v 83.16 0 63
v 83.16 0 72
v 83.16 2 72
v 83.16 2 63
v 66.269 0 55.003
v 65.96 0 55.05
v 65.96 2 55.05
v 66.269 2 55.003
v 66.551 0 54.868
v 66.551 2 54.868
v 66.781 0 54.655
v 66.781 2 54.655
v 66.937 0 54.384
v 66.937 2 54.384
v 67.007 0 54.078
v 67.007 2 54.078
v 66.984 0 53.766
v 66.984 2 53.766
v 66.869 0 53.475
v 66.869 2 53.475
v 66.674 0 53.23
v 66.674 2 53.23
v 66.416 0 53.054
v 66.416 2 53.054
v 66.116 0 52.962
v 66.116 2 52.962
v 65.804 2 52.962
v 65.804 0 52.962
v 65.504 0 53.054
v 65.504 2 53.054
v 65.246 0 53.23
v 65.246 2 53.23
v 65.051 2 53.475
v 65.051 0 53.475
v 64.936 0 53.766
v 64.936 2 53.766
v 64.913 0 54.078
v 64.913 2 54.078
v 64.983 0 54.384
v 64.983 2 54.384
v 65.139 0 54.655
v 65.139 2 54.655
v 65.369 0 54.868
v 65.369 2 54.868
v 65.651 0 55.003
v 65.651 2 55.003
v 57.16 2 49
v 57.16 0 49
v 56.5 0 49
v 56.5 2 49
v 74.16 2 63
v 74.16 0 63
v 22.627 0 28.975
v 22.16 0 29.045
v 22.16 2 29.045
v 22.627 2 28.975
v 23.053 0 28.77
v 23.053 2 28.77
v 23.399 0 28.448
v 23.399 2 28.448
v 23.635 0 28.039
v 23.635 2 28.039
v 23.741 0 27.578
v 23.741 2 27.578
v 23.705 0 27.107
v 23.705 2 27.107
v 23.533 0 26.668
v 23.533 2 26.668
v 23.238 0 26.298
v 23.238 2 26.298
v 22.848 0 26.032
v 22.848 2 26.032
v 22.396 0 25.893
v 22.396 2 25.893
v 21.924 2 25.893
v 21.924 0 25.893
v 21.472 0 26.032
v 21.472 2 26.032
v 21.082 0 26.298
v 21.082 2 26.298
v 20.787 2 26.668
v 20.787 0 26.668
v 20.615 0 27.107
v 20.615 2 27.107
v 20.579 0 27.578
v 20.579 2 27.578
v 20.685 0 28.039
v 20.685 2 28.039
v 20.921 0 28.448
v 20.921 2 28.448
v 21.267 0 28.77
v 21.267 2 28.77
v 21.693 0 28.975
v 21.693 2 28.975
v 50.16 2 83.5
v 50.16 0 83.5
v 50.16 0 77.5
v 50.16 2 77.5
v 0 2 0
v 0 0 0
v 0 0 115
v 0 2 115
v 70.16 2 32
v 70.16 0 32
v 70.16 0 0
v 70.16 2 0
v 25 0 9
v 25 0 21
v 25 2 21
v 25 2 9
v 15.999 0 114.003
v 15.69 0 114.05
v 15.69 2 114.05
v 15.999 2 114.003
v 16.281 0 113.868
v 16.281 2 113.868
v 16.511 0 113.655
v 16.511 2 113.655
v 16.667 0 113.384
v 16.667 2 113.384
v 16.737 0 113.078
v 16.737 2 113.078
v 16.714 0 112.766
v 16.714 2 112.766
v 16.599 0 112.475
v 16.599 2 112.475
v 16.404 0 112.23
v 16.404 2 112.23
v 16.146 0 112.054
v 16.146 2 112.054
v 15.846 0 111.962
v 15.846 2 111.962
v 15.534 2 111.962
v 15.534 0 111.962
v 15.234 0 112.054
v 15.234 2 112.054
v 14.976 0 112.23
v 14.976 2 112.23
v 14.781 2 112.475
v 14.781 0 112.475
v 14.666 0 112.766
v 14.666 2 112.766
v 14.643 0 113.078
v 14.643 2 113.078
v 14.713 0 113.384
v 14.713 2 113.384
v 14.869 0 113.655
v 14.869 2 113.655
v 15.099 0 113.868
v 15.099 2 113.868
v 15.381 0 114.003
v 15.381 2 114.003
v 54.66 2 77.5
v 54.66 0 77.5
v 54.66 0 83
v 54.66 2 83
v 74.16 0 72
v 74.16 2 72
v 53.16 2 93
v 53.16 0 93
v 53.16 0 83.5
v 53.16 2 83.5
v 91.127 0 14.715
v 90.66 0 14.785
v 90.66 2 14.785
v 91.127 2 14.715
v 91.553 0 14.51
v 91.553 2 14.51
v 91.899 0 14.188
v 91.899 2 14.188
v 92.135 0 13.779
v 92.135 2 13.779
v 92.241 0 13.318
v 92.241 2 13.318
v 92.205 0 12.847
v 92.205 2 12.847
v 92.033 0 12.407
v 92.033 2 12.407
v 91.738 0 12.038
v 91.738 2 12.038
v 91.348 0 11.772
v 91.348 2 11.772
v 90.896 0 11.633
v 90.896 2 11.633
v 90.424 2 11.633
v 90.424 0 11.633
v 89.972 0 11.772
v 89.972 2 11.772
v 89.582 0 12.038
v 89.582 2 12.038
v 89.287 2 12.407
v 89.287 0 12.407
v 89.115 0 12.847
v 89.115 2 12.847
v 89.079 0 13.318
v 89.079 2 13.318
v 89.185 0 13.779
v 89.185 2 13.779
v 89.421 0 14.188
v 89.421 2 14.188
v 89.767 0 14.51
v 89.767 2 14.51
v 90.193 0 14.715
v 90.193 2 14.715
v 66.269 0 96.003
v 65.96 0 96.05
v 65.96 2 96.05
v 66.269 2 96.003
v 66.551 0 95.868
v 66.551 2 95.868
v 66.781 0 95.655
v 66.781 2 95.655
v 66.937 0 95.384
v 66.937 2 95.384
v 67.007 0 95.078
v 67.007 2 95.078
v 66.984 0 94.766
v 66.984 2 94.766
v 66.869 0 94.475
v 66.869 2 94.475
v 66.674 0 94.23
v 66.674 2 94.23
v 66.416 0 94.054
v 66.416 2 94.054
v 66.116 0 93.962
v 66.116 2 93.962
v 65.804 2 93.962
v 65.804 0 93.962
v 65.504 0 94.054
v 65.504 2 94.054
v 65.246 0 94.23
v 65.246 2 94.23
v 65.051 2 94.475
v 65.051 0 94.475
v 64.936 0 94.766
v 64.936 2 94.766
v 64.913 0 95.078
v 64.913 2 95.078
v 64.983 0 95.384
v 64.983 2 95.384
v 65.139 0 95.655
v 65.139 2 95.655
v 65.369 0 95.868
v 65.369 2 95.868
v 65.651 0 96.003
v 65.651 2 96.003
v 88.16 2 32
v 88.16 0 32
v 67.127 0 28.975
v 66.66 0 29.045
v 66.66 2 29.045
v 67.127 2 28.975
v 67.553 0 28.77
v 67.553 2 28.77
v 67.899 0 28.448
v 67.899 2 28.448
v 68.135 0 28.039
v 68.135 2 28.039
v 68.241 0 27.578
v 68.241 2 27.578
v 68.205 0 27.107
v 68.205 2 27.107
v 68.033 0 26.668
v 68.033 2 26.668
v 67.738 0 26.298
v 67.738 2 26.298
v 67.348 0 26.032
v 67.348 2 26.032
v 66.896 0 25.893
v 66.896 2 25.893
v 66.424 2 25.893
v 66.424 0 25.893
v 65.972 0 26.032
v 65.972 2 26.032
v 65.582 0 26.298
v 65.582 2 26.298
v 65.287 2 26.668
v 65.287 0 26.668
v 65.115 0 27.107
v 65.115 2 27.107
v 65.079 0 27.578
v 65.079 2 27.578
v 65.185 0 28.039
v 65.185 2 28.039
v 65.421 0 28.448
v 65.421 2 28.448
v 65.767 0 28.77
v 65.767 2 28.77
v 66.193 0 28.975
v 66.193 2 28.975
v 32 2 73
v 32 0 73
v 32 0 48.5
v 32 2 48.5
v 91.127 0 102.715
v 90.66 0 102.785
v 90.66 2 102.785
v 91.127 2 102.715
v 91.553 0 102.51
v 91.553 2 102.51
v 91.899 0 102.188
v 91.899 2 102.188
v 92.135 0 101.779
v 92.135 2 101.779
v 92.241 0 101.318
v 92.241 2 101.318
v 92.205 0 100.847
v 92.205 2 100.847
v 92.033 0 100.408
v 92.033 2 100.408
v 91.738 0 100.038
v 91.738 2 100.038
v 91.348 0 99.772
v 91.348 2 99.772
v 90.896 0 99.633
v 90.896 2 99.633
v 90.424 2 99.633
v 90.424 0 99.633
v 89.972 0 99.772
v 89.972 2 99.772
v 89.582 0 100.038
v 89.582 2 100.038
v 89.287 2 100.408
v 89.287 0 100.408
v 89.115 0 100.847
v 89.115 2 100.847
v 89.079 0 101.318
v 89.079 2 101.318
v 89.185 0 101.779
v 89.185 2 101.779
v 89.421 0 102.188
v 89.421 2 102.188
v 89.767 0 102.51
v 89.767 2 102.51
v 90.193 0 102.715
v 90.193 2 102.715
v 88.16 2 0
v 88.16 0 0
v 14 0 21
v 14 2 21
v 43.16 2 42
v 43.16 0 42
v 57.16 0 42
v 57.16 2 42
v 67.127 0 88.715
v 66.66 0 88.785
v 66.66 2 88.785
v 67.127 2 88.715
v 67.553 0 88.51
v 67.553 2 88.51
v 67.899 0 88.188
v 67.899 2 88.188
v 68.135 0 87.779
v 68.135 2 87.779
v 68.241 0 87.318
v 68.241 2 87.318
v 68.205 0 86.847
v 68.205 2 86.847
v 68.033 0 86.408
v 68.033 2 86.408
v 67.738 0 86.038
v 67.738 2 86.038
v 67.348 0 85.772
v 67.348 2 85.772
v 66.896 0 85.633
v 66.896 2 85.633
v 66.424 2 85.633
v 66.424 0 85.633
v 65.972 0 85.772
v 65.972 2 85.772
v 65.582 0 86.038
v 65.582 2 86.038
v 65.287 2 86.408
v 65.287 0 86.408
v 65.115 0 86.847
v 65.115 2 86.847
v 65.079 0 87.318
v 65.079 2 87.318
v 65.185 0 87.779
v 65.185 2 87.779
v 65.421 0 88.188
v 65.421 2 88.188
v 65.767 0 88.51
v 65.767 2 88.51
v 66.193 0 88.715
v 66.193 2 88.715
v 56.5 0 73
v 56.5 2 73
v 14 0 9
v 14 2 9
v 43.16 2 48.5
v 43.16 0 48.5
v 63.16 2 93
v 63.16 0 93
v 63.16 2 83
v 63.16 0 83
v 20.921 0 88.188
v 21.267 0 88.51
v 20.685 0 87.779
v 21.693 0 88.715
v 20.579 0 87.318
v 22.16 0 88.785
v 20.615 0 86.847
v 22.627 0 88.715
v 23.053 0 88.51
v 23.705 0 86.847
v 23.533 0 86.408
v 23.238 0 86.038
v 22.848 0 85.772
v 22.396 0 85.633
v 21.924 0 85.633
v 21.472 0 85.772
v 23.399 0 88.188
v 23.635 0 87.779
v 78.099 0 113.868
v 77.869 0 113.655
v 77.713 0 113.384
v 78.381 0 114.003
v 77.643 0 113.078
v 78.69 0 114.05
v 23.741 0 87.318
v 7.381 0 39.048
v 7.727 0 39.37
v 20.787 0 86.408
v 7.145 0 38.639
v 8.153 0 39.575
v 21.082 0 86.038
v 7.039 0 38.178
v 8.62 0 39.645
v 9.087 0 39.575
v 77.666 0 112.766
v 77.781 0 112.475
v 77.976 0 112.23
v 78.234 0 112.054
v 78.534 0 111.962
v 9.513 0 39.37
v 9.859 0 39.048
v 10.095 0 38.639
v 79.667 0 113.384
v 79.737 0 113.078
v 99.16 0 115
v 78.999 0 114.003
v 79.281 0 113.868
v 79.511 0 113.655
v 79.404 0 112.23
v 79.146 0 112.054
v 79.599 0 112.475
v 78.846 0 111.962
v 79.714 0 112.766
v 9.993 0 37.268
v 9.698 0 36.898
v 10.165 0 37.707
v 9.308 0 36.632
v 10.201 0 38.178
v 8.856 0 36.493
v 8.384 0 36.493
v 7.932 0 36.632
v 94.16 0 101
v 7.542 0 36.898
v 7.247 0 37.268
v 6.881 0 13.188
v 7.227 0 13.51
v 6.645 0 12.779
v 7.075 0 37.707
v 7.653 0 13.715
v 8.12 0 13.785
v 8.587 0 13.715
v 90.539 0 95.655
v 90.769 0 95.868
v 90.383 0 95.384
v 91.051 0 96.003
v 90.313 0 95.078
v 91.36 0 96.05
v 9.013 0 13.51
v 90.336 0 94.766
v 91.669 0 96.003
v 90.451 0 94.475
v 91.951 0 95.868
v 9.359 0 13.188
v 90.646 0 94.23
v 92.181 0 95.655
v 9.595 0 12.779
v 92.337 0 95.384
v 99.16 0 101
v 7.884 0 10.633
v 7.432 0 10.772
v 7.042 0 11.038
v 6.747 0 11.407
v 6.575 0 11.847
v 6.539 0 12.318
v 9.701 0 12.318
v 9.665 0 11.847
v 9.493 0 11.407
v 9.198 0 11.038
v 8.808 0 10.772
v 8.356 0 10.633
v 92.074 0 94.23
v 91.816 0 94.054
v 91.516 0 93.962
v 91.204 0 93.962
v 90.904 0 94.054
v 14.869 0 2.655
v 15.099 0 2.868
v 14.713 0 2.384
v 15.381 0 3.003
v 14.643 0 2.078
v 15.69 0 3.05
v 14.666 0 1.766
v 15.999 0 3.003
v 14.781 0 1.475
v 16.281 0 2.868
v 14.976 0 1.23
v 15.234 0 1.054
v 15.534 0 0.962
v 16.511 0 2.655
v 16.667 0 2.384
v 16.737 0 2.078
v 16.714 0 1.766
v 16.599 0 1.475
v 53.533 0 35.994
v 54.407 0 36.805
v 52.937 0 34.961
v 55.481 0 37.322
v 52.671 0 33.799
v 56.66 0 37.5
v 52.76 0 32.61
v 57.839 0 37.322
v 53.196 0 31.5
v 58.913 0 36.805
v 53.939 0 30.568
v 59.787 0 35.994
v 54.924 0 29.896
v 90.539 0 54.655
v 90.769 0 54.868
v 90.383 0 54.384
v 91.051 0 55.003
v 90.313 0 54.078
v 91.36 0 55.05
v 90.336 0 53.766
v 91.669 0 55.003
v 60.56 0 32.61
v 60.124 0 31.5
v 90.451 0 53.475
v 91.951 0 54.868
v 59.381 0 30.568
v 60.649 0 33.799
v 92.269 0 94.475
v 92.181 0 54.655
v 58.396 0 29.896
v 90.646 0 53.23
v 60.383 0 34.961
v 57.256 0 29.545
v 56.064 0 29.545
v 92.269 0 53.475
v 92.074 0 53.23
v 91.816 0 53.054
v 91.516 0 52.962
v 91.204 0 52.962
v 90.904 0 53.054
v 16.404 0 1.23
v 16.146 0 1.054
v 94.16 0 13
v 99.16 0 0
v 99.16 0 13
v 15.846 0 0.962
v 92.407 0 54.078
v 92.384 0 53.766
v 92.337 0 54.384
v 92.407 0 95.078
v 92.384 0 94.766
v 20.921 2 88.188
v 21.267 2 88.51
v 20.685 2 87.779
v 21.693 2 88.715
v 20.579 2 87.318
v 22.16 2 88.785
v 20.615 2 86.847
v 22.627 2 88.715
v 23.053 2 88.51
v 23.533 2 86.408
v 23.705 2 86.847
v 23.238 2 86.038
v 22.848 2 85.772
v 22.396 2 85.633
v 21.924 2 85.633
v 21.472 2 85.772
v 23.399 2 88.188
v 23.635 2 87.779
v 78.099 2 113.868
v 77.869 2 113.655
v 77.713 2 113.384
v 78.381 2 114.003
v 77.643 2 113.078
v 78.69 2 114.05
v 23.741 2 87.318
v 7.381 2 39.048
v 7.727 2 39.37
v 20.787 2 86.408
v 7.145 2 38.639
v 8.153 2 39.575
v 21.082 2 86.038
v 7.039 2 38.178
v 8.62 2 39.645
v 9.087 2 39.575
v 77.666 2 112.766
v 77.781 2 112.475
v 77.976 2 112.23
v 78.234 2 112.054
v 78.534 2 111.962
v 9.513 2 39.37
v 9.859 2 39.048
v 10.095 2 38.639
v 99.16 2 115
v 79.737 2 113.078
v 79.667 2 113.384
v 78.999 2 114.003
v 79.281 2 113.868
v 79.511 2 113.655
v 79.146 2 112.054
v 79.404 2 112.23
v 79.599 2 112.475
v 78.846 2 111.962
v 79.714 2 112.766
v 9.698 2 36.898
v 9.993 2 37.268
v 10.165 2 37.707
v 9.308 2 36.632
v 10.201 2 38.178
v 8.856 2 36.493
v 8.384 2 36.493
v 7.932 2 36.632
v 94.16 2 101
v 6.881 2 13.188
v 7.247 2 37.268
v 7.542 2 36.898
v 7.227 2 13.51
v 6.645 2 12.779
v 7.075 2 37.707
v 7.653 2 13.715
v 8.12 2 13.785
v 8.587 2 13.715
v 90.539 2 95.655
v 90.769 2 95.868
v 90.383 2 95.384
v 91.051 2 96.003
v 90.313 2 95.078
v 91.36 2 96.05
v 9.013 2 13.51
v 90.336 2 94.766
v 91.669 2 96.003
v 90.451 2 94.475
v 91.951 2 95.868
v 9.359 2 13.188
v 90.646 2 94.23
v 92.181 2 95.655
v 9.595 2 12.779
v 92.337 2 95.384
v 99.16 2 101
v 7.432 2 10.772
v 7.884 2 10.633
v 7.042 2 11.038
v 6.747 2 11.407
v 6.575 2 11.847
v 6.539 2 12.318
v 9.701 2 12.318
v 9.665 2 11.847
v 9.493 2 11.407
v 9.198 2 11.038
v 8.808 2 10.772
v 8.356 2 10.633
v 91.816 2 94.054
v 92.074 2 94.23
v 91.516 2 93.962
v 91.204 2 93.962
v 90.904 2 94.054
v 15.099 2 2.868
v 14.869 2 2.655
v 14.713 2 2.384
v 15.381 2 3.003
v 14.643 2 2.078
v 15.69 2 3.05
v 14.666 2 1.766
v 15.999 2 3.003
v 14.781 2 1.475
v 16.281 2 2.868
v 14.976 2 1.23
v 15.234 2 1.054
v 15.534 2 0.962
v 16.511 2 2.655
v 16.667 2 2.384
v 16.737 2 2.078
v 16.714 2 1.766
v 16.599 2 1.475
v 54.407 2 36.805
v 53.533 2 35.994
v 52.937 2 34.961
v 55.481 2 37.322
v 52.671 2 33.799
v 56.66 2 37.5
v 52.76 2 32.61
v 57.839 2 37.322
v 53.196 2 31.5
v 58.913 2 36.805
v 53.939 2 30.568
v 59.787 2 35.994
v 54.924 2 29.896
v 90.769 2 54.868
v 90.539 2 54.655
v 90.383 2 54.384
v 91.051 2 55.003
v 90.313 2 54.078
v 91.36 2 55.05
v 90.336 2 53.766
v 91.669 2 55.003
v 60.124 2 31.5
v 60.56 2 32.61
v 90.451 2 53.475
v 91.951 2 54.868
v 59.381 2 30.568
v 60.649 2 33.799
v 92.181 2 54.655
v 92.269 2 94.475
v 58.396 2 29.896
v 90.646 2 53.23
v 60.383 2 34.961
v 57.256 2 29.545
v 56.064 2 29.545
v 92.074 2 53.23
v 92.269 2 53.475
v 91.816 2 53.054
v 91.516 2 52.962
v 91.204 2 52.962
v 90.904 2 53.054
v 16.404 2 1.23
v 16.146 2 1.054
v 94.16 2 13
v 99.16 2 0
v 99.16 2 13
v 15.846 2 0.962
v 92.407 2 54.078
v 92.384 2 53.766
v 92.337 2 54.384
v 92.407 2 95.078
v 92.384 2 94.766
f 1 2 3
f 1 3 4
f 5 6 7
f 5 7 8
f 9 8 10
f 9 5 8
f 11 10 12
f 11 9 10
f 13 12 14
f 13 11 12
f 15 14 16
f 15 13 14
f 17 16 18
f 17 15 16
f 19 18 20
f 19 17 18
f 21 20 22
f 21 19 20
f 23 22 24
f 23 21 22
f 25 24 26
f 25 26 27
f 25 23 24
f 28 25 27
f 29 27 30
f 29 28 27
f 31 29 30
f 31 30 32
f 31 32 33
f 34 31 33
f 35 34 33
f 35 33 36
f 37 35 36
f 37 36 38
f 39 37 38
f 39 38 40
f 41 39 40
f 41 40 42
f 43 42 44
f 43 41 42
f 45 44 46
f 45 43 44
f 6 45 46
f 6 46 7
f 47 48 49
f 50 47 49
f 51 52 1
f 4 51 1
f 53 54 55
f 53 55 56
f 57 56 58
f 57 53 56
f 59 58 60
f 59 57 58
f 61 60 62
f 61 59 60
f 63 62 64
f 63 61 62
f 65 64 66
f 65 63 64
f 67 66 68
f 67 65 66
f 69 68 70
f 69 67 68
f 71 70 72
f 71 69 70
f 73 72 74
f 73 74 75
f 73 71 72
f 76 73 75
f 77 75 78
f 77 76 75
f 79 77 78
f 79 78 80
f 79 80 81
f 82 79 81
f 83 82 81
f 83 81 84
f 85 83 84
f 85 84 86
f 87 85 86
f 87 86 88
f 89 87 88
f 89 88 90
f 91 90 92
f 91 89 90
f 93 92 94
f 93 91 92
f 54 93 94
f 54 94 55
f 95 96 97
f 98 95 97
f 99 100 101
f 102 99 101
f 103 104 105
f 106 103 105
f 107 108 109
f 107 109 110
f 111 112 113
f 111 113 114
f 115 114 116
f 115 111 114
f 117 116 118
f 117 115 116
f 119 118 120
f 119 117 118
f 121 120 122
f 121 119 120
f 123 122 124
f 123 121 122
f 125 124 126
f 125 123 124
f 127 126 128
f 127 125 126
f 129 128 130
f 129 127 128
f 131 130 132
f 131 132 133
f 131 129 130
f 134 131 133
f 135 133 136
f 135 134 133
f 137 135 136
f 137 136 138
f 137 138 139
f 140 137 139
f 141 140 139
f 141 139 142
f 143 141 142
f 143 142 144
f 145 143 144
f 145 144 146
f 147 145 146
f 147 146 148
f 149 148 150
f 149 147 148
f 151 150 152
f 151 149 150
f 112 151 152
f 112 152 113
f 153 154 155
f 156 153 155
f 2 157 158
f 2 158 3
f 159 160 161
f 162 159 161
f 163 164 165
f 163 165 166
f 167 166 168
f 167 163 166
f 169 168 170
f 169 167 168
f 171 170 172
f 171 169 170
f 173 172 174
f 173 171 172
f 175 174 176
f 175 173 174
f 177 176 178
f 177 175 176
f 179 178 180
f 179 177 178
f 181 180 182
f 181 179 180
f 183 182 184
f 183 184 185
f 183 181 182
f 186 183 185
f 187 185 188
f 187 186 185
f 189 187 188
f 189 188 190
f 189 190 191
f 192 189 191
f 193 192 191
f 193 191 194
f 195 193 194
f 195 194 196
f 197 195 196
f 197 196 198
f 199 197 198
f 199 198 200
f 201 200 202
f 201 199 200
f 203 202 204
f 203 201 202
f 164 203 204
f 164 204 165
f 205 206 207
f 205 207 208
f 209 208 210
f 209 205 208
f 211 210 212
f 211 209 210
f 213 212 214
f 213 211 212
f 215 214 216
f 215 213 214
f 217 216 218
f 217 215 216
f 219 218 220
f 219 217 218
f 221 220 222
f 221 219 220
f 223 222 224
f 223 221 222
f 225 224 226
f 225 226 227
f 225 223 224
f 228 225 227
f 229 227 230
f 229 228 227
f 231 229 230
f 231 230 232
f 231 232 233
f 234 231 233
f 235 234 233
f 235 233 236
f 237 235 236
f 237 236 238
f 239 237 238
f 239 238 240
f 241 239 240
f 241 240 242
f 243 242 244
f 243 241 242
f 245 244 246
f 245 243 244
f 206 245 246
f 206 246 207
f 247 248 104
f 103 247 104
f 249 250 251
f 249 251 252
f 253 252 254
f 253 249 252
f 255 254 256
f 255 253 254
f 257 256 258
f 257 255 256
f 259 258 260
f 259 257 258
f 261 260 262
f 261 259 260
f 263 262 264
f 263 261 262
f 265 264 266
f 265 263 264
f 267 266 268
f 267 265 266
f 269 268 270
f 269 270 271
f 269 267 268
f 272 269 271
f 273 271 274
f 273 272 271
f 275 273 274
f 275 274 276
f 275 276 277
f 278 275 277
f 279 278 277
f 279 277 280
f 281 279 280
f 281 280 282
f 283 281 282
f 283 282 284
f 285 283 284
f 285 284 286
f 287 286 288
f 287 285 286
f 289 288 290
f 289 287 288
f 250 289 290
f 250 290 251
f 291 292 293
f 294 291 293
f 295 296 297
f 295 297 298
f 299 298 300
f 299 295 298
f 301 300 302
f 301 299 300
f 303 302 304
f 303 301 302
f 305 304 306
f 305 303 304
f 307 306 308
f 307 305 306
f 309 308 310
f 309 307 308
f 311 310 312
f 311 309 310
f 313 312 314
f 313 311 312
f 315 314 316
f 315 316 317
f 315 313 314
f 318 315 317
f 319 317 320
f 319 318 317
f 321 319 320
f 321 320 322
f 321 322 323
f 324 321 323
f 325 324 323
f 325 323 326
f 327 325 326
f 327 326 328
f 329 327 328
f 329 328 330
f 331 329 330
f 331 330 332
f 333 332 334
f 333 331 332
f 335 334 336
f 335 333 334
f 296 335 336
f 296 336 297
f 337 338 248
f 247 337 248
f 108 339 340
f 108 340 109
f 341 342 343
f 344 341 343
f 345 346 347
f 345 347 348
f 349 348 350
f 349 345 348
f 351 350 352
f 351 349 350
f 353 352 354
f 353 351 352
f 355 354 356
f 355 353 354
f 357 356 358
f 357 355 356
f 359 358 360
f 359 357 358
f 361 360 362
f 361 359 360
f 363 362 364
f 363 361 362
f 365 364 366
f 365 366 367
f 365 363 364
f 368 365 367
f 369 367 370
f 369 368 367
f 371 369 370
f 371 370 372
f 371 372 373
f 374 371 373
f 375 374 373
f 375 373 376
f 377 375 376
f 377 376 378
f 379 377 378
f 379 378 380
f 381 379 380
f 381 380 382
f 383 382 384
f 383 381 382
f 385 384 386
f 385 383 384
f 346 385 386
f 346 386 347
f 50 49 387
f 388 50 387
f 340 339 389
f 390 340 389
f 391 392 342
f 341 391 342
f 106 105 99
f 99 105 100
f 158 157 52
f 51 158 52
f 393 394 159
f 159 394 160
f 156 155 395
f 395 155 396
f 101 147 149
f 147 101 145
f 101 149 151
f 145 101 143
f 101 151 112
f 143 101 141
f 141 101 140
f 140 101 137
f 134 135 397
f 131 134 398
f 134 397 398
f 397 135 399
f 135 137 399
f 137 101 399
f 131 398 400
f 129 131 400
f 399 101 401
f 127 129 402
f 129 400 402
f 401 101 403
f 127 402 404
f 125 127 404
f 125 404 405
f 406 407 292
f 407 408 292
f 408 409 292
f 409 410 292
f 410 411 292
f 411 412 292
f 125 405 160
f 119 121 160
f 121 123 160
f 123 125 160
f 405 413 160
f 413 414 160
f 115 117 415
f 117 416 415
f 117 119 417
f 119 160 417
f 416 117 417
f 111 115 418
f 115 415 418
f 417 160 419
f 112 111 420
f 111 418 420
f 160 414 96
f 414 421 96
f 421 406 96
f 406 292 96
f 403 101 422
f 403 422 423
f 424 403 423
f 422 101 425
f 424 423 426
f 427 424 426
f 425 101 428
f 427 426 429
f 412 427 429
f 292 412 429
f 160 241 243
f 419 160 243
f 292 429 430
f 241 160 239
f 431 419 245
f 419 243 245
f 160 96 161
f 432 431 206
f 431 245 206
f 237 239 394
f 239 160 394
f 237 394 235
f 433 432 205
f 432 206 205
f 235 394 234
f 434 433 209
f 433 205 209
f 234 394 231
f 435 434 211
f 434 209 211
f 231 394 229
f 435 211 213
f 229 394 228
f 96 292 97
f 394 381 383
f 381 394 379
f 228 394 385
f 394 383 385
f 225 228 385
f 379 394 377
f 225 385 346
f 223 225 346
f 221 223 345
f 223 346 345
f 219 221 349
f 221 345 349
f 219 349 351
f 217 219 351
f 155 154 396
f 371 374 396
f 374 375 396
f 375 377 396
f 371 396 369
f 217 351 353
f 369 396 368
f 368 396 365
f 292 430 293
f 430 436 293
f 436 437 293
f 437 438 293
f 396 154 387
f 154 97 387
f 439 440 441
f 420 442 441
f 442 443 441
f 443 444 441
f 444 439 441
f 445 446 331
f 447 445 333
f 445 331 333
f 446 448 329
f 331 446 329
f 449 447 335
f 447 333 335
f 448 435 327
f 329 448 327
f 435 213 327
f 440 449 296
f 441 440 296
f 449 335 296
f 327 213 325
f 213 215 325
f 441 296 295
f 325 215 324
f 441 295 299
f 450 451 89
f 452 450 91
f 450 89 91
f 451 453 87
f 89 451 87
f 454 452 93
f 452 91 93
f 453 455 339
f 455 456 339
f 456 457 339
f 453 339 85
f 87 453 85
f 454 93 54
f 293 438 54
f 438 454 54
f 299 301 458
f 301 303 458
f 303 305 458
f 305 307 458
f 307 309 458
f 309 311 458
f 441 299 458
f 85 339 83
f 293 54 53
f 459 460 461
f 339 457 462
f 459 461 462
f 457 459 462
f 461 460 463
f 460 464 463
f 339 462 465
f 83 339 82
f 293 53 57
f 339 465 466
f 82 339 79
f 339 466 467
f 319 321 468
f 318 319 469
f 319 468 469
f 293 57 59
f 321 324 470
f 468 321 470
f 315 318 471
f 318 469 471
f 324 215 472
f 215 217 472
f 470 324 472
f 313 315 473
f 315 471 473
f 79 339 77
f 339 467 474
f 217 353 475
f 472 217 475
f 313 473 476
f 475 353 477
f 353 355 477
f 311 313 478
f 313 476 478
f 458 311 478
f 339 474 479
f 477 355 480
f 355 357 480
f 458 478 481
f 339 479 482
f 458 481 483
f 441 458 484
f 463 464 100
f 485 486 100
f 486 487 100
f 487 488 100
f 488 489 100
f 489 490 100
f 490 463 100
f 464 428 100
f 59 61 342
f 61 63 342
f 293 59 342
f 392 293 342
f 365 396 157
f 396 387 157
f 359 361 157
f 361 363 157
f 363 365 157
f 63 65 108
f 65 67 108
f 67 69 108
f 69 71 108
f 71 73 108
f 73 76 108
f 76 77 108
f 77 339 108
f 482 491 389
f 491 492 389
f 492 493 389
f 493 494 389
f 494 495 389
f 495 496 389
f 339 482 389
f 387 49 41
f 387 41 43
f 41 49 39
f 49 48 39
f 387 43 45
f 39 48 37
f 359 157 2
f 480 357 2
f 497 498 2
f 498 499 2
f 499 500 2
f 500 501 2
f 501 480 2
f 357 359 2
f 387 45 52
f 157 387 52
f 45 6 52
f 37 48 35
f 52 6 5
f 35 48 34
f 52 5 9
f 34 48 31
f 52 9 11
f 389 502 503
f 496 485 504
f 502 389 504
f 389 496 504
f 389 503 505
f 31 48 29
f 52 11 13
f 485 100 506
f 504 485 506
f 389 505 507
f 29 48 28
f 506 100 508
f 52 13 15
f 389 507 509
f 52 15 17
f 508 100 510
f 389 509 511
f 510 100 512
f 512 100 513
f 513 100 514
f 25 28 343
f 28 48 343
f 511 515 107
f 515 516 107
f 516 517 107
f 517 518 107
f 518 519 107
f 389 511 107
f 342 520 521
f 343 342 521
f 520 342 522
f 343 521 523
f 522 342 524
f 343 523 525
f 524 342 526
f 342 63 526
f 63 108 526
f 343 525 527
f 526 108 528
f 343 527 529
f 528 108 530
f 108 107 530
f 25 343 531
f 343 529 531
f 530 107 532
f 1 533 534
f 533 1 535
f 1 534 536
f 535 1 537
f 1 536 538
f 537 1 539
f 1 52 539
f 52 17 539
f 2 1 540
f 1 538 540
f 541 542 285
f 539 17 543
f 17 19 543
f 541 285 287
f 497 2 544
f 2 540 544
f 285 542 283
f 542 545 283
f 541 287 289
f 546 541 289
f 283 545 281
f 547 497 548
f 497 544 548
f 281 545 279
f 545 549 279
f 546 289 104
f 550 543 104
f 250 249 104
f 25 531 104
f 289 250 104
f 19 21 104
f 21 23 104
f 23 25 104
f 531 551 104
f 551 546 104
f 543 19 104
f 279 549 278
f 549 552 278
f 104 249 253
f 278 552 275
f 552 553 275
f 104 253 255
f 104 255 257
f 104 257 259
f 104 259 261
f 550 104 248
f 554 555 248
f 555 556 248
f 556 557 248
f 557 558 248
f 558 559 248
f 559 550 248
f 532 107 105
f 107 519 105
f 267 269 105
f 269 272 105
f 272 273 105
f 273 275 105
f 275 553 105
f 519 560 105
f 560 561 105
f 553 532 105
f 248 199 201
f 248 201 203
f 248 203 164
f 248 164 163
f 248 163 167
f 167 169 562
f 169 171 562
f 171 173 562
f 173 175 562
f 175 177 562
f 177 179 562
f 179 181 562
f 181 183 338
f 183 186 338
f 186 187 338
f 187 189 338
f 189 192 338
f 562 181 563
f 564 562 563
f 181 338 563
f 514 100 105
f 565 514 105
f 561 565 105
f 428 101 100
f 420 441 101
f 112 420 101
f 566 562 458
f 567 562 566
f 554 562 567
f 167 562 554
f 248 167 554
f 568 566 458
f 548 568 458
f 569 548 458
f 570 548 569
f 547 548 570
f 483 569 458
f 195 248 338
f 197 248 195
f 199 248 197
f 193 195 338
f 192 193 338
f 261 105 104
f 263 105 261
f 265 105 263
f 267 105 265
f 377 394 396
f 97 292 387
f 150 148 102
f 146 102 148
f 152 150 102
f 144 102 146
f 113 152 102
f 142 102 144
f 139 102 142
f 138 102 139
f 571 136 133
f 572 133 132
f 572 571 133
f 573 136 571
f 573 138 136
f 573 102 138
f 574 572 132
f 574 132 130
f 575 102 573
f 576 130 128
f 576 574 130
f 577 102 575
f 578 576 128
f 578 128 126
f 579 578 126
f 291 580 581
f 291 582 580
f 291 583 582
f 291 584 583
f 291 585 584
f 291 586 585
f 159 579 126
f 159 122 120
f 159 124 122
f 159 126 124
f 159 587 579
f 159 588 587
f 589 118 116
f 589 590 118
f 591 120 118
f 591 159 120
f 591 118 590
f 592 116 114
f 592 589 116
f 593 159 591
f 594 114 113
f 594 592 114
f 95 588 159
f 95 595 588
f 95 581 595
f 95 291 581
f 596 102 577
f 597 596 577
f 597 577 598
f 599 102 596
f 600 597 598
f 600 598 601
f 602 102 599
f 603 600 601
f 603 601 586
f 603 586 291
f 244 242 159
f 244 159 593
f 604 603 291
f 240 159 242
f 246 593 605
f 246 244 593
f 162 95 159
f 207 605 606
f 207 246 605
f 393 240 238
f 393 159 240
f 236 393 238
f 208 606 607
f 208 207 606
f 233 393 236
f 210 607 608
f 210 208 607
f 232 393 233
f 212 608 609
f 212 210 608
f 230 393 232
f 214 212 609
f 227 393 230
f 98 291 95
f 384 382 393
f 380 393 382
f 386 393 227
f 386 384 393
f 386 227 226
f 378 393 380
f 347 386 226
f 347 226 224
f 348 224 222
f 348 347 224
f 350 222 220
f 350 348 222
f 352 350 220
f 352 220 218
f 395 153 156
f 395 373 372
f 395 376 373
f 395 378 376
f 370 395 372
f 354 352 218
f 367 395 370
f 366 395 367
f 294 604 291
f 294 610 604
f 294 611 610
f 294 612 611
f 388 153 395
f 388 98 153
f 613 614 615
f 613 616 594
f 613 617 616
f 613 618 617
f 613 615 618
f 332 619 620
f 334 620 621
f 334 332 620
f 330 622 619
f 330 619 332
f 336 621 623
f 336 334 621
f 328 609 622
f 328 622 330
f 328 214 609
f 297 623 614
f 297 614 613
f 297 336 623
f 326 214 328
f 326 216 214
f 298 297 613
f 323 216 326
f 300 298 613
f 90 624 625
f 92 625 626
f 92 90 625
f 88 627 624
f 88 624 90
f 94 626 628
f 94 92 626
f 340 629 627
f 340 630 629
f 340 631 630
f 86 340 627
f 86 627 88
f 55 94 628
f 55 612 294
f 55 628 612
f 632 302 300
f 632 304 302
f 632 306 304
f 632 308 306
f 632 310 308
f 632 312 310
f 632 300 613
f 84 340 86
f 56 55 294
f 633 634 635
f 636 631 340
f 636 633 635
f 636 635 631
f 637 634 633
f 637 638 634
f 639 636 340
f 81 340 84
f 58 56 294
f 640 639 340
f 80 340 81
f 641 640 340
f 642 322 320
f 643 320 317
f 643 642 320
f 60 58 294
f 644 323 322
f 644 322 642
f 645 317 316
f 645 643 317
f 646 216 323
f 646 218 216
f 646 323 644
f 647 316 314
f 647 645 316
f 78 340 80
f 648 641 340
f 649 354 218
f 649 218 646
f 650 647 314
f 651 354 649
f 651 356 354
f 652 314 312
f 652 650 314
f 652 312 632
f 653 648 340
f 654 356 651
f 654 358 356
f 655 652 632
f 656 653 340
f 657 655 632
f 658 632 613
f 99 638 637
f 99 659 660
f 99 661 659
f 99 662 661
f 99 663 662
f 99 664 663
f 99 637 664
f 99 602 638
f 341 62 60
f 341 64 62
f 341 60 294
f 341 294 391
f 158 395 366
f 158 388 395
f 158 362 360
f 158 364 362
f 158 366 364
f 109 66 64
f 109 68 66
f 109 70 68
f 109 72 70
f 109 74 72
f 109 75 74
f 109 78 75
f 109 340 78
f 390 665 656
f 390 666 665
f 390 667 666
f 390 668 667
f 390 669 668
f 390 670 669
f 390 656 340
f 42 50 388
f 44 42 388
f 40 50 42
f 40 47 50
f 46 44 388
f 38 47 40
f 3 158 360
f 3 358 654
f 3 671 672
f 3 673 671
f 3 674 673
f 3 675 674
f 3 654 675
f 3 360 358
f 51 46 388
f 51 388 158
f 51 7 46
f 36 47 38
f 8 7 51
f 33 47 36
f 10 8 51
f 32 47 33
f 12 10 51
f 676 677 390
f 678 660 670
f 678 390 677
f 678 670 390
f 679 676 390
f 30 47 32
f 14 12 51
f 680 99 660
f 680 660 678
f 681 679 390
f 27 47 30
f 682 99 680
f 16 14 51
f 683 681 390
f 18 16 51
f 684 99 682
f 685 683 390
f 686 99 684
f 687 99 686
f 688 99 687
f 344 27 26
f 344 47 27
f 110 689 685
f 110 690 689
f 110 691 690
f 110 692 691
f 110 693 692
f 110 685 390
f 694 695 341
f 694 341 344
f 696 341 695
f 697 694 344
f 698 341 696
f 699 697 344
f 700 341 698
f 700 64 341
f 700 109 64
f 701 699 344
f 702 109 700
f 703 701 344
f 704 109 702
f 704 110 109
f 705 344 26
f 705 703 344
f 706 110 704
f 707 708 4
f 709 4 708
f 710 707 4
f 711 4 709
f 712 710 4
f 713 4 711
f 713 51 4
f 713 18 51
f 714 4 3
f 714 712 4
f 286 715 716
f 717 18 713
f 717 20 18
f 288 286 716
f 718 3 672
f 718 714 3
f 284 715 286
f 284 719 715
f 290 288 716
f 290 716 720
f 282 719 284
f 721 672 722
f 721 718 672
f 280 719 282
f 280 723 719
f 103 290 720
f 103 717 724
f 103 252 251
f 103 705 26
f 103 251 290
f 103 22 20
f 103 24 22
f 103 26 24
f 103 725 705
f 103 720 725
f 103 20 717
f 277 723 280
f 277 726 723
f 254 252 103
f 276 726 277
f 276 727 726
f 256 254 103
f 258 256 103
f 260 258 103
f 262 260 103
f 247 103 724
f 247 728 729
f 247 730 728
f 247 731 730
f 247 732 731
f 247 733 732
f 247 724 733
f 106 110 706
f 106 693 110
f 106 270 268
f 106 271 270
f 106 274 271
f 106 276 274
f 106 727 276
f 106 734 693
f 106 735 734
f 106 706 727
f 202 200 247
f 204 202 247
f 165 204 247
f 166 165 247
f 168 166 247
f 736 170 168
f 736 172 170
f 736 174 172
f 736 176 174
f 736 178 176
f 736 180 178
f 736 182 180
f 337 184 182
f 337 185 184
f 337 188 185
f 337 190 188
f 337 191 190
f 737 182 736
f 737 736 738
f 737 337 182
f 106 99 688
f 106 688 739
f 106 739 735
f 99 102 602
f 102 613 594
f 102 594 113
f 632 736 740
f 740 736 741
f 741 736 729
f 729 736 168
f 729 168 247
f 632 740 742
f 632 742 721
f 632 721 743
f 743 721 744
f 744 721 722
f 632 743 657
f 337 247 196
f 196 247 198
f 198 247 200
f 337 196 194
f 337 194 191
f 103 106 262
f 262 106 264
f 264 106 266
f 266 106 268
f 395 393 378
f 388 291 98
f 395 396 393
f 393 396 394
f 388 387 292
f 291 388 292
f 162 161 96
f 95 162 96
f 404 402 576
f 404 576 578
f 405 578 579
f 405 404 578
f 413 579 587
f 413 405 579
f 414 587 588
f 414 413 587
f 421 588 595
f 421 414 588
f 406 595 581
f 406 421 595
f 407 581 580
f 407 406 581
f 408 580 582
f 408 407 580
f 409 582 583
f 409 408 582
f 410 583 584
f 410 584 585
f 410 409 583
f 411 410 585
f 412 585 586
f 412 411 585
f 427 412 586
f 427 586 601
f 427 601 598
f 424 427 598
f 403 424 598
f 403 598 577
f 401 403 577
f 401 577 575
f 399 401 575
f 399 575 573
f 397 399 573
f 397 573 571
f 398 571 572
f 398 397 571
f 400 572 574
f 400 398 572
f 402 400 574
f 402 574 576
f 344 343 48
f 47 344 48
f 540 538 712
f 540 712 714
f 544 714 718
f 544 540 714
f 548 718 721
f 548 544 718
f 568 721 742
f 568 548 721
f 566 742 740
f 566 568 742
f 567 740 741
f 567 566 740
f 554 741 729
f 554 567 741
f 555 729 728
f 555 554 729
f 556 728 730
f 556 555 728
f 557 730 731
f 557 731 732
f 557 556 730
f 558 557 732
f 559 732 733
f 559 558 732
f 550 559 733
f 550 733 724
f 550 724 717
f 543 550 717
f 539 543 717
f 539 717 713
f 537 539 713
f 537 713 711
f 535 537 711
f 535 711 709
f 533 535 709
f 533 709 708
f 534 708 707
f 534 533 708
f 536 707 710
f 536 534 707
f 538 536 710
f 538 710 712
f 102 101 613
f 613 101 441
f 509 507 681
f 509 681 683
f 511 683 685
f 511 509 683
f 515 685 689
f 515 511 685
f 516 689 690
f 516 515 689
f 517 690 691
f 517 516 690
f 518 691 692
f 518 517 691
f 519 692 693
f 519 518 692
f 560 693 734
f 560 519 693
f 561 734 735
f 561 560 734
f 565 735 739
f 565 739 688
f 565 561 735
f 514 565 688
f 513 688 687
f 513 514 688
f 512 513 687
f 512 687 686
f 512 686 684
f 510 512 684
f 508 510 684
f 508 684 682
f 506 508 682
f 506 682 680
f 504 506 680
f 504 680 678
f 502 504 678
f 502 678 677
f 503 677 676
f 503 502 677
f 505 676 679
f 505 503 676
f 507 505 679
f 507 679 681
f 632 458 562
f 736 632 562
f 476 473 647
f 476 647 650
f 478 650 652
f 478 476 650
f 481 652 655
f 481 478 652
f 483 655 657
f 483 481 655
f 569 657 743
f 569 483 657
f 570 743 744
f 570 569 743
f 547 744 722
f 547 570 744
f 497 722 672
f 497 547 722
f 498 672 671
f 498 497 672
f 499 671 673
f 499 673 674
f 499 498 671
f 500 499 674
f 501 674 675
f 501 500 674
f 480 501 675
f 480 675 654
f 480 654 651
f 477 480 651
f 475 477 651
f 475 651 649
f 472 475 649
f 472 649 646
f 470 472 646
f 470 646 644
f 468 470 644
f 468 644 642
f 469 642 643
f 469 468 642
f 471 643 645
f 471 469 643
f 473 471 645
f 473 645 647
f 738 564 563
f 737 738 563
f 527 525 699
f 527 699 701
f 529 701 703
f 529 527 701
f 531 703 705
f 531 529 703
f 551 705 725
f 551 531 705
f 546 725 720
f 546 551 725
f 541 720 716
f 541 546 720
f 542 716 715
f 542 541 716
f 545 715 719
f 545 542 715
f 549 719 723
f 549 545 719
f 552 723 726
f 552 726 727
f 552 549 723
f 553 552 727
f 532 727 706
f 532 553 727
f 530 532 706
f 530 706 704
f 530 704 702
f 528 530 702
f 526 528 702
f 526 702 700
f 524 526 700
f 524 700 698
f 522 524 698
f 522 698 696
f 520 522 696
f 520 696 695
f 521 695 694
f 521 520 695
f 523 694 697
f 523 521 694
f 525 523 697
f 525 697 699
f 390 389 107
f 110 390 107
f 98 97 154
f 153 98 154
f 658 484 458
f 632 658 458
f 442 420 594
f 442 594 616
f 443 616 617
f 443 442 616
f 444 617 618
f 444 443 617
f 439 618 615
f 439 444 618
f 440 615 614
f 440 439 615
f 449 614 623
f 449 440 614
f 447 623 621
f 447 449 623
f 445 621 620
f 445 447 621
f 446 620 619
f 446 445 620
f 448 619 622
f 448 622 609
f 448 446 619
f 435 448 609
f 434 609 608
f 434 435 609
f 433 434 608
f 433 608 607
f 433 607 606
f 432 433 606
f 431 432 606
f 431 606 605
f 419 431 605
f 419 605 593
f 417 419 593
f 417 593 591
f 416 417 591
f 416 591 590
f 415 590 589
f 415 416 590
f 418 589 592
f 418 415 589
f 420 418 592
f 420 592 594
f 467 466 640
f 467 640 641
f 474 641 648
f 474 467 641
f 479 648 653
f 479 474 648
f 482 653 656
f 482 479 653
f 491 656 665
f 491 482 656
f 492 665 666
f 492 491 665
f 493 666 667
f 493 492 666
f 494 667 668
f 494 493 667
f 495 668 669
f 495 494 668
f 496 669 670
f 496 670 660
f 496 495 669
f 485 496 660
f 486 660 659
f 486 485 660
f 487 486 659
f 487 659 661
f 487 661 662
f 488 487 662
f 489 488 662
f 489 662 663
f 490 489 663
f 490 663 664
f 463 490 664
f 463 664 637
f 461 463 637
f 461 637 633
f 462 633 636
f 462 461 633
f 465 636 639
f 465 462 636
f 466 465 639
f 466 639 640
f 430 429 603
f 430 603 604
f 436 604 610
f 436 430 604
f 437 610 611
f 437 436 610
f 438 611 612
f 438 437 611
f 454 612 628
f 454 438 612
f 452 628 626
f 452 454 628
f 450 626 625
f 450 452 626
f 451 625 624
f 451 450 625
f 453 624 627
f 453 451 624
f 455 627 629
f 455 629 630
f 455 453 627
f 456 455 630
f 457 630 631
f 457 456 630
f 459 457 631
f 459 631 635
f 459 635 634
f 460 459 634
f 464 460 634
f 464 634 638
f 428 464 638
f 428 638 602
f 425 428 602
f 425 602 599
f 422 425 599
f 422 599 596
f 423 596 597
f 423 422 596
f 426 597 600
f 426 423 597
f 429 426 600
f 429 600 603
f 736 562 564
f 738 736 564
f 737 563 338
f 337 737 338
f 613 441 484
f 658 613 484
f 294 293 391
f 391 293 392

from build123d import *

# Parameters (mm, degrees)
SKETCH_1_R      = 1.05
SKETCH_1_R_2    = 1.585
SKETCH_1_W      = 9
SKETCH_1_H      = 9
SKETCH_1_W_2    = 11
SKETCH_1_H_2    = 12
SKETCH_1_R_3    = 4
EXTRUDE_1_DEPTH = 2


with BuildPart() as part:
    # 草图1 → 凸台-拉伸1 (new body)
    with BuildSketch(Plane(origin=(0, 0, 0), x_dir=(1, 0, 0), z_dir=(0, 1, 0))):
        Polygon((70.16, 0), (0, 0), (0, -115), (99.16, -115), (99.16, -101), (94.16, -101), (94.16, -13), (99.16, -13), (99.16, 0), (88.16, 0), (88.16, -32), (70.16, -32), align=None)
        with Locations(Location((15.69, -113, 0), (0, 0, 270))):
            Circle(SKETCH_1_R, mode=Mode.SUBTRACT)
        with Locations(Location((22.16, -87.2, 0), (0, 0, 270))):
            Circle(SKETCH_1_R_2, mode=Mode.SUBTRACT)
        Polygon((43.16, -48.5), (43.16, -42), (57.16, -42), (57.16, -49), (56.5, -49), (56.5, -73), (32, -73), (32, -48.5), align=None, mode=Mode.SUBTRACT)
        with Locations(Location((65.96, -95, 0), (0, 0, 270))):
            Circle(SKETCH_1_R, mode=Mode.SUBTRACT)
        with Locations(Location((66.66, -87.2, 0), (0, 0, 270))):
            Circle(SKETCH_1_R_2, mode=Mode.SUBTRACT)
        with Locations(Location((78.69, -113, 0), (0, 0, 270))):
            Circle(SKETCH_1_R, mode=Mode.SUBTRACT)
        with Locations(Location((90.66, -101.2, 0), (0, 0, 270))):
            Circle(SKETCH_1_R_2, mode=Mode.SUBTRACT)
        with Locations(Location((91.36, -95, 0), (0, 0, 270))):
            Circle(SKETCH_1_R, mode=Mode.SUBTRACT)
        Polygon((50.16, -83.5), (50.16, -77.5), (54.66, -77.5), (54.66, -83), (63.16, -83), (63.16, -93), (53.16, -93), (53.16, -83.5), align=None, mode=Mode.SUBTRACT)
        with Locations((78.66, -67.5)):
            Rectangle(SKETCH_1_W, SKETCH_1_H, mode=Mode.SUBTRACT)
        with Locations(Location((22.16, -27.46, 0), (0, 0, 270))):
            Circle(SKETCH_1_R_2, mode=Mode.SUBTRACT)
        with Locations((19.5, -15)):
            Rectangle(SKETCH_1_W_2, SKETCH_1_H_2, mode=Mode.SUBTRACT)
        with Locations(Location((15.69, -2, 0), (0, 0, 270))):
            Circle(SKETCH_1_R, mode=Mode.SUBTRACT)
        with Locations(Location((65.96, -54, 0), (0, 0, 270))):
            Circle(SKETCH_1_R, mode=Mode.SUBTRACT)
        with Locations(Location((56.66, -33.5, 0), (0, 0, 270))):
            Circle(SKETCH_1_R_3, mode=Mode.SUBTRACT)
        with Locations(Location((91.36, -54, 0), (0, 0, 270))):
            Circle(SKETCH_1_R, mode=Mode.SUBTRACT)
        with Locations(Location((66.66, -27.46, 0), (0, 0, 270))):
            Circle(SKETCH_1_R_2, mode=Mode.SUBTRACT)
        with Locations(Location((90.66, -13.2, 0), (0, 0, 270))):
            Circle(SKETCH_1_R_2, mode=Mode.SUBTRACT)
        with Locations(Location((8.12, -12.2, 0), (0, 0, 270))):
            Circle(SKETCH_1_R_2, mode=Mode.SUBTRACT)
        with Locations(Location((8.62, -38.06, 0), (0, 0, 270))):
            Circle(SKETCH_1_R_2, mode=Mode.SUBTRACT)
    extrude(amount=EXTRUDE_1_DEPTH)


solid = part.part
